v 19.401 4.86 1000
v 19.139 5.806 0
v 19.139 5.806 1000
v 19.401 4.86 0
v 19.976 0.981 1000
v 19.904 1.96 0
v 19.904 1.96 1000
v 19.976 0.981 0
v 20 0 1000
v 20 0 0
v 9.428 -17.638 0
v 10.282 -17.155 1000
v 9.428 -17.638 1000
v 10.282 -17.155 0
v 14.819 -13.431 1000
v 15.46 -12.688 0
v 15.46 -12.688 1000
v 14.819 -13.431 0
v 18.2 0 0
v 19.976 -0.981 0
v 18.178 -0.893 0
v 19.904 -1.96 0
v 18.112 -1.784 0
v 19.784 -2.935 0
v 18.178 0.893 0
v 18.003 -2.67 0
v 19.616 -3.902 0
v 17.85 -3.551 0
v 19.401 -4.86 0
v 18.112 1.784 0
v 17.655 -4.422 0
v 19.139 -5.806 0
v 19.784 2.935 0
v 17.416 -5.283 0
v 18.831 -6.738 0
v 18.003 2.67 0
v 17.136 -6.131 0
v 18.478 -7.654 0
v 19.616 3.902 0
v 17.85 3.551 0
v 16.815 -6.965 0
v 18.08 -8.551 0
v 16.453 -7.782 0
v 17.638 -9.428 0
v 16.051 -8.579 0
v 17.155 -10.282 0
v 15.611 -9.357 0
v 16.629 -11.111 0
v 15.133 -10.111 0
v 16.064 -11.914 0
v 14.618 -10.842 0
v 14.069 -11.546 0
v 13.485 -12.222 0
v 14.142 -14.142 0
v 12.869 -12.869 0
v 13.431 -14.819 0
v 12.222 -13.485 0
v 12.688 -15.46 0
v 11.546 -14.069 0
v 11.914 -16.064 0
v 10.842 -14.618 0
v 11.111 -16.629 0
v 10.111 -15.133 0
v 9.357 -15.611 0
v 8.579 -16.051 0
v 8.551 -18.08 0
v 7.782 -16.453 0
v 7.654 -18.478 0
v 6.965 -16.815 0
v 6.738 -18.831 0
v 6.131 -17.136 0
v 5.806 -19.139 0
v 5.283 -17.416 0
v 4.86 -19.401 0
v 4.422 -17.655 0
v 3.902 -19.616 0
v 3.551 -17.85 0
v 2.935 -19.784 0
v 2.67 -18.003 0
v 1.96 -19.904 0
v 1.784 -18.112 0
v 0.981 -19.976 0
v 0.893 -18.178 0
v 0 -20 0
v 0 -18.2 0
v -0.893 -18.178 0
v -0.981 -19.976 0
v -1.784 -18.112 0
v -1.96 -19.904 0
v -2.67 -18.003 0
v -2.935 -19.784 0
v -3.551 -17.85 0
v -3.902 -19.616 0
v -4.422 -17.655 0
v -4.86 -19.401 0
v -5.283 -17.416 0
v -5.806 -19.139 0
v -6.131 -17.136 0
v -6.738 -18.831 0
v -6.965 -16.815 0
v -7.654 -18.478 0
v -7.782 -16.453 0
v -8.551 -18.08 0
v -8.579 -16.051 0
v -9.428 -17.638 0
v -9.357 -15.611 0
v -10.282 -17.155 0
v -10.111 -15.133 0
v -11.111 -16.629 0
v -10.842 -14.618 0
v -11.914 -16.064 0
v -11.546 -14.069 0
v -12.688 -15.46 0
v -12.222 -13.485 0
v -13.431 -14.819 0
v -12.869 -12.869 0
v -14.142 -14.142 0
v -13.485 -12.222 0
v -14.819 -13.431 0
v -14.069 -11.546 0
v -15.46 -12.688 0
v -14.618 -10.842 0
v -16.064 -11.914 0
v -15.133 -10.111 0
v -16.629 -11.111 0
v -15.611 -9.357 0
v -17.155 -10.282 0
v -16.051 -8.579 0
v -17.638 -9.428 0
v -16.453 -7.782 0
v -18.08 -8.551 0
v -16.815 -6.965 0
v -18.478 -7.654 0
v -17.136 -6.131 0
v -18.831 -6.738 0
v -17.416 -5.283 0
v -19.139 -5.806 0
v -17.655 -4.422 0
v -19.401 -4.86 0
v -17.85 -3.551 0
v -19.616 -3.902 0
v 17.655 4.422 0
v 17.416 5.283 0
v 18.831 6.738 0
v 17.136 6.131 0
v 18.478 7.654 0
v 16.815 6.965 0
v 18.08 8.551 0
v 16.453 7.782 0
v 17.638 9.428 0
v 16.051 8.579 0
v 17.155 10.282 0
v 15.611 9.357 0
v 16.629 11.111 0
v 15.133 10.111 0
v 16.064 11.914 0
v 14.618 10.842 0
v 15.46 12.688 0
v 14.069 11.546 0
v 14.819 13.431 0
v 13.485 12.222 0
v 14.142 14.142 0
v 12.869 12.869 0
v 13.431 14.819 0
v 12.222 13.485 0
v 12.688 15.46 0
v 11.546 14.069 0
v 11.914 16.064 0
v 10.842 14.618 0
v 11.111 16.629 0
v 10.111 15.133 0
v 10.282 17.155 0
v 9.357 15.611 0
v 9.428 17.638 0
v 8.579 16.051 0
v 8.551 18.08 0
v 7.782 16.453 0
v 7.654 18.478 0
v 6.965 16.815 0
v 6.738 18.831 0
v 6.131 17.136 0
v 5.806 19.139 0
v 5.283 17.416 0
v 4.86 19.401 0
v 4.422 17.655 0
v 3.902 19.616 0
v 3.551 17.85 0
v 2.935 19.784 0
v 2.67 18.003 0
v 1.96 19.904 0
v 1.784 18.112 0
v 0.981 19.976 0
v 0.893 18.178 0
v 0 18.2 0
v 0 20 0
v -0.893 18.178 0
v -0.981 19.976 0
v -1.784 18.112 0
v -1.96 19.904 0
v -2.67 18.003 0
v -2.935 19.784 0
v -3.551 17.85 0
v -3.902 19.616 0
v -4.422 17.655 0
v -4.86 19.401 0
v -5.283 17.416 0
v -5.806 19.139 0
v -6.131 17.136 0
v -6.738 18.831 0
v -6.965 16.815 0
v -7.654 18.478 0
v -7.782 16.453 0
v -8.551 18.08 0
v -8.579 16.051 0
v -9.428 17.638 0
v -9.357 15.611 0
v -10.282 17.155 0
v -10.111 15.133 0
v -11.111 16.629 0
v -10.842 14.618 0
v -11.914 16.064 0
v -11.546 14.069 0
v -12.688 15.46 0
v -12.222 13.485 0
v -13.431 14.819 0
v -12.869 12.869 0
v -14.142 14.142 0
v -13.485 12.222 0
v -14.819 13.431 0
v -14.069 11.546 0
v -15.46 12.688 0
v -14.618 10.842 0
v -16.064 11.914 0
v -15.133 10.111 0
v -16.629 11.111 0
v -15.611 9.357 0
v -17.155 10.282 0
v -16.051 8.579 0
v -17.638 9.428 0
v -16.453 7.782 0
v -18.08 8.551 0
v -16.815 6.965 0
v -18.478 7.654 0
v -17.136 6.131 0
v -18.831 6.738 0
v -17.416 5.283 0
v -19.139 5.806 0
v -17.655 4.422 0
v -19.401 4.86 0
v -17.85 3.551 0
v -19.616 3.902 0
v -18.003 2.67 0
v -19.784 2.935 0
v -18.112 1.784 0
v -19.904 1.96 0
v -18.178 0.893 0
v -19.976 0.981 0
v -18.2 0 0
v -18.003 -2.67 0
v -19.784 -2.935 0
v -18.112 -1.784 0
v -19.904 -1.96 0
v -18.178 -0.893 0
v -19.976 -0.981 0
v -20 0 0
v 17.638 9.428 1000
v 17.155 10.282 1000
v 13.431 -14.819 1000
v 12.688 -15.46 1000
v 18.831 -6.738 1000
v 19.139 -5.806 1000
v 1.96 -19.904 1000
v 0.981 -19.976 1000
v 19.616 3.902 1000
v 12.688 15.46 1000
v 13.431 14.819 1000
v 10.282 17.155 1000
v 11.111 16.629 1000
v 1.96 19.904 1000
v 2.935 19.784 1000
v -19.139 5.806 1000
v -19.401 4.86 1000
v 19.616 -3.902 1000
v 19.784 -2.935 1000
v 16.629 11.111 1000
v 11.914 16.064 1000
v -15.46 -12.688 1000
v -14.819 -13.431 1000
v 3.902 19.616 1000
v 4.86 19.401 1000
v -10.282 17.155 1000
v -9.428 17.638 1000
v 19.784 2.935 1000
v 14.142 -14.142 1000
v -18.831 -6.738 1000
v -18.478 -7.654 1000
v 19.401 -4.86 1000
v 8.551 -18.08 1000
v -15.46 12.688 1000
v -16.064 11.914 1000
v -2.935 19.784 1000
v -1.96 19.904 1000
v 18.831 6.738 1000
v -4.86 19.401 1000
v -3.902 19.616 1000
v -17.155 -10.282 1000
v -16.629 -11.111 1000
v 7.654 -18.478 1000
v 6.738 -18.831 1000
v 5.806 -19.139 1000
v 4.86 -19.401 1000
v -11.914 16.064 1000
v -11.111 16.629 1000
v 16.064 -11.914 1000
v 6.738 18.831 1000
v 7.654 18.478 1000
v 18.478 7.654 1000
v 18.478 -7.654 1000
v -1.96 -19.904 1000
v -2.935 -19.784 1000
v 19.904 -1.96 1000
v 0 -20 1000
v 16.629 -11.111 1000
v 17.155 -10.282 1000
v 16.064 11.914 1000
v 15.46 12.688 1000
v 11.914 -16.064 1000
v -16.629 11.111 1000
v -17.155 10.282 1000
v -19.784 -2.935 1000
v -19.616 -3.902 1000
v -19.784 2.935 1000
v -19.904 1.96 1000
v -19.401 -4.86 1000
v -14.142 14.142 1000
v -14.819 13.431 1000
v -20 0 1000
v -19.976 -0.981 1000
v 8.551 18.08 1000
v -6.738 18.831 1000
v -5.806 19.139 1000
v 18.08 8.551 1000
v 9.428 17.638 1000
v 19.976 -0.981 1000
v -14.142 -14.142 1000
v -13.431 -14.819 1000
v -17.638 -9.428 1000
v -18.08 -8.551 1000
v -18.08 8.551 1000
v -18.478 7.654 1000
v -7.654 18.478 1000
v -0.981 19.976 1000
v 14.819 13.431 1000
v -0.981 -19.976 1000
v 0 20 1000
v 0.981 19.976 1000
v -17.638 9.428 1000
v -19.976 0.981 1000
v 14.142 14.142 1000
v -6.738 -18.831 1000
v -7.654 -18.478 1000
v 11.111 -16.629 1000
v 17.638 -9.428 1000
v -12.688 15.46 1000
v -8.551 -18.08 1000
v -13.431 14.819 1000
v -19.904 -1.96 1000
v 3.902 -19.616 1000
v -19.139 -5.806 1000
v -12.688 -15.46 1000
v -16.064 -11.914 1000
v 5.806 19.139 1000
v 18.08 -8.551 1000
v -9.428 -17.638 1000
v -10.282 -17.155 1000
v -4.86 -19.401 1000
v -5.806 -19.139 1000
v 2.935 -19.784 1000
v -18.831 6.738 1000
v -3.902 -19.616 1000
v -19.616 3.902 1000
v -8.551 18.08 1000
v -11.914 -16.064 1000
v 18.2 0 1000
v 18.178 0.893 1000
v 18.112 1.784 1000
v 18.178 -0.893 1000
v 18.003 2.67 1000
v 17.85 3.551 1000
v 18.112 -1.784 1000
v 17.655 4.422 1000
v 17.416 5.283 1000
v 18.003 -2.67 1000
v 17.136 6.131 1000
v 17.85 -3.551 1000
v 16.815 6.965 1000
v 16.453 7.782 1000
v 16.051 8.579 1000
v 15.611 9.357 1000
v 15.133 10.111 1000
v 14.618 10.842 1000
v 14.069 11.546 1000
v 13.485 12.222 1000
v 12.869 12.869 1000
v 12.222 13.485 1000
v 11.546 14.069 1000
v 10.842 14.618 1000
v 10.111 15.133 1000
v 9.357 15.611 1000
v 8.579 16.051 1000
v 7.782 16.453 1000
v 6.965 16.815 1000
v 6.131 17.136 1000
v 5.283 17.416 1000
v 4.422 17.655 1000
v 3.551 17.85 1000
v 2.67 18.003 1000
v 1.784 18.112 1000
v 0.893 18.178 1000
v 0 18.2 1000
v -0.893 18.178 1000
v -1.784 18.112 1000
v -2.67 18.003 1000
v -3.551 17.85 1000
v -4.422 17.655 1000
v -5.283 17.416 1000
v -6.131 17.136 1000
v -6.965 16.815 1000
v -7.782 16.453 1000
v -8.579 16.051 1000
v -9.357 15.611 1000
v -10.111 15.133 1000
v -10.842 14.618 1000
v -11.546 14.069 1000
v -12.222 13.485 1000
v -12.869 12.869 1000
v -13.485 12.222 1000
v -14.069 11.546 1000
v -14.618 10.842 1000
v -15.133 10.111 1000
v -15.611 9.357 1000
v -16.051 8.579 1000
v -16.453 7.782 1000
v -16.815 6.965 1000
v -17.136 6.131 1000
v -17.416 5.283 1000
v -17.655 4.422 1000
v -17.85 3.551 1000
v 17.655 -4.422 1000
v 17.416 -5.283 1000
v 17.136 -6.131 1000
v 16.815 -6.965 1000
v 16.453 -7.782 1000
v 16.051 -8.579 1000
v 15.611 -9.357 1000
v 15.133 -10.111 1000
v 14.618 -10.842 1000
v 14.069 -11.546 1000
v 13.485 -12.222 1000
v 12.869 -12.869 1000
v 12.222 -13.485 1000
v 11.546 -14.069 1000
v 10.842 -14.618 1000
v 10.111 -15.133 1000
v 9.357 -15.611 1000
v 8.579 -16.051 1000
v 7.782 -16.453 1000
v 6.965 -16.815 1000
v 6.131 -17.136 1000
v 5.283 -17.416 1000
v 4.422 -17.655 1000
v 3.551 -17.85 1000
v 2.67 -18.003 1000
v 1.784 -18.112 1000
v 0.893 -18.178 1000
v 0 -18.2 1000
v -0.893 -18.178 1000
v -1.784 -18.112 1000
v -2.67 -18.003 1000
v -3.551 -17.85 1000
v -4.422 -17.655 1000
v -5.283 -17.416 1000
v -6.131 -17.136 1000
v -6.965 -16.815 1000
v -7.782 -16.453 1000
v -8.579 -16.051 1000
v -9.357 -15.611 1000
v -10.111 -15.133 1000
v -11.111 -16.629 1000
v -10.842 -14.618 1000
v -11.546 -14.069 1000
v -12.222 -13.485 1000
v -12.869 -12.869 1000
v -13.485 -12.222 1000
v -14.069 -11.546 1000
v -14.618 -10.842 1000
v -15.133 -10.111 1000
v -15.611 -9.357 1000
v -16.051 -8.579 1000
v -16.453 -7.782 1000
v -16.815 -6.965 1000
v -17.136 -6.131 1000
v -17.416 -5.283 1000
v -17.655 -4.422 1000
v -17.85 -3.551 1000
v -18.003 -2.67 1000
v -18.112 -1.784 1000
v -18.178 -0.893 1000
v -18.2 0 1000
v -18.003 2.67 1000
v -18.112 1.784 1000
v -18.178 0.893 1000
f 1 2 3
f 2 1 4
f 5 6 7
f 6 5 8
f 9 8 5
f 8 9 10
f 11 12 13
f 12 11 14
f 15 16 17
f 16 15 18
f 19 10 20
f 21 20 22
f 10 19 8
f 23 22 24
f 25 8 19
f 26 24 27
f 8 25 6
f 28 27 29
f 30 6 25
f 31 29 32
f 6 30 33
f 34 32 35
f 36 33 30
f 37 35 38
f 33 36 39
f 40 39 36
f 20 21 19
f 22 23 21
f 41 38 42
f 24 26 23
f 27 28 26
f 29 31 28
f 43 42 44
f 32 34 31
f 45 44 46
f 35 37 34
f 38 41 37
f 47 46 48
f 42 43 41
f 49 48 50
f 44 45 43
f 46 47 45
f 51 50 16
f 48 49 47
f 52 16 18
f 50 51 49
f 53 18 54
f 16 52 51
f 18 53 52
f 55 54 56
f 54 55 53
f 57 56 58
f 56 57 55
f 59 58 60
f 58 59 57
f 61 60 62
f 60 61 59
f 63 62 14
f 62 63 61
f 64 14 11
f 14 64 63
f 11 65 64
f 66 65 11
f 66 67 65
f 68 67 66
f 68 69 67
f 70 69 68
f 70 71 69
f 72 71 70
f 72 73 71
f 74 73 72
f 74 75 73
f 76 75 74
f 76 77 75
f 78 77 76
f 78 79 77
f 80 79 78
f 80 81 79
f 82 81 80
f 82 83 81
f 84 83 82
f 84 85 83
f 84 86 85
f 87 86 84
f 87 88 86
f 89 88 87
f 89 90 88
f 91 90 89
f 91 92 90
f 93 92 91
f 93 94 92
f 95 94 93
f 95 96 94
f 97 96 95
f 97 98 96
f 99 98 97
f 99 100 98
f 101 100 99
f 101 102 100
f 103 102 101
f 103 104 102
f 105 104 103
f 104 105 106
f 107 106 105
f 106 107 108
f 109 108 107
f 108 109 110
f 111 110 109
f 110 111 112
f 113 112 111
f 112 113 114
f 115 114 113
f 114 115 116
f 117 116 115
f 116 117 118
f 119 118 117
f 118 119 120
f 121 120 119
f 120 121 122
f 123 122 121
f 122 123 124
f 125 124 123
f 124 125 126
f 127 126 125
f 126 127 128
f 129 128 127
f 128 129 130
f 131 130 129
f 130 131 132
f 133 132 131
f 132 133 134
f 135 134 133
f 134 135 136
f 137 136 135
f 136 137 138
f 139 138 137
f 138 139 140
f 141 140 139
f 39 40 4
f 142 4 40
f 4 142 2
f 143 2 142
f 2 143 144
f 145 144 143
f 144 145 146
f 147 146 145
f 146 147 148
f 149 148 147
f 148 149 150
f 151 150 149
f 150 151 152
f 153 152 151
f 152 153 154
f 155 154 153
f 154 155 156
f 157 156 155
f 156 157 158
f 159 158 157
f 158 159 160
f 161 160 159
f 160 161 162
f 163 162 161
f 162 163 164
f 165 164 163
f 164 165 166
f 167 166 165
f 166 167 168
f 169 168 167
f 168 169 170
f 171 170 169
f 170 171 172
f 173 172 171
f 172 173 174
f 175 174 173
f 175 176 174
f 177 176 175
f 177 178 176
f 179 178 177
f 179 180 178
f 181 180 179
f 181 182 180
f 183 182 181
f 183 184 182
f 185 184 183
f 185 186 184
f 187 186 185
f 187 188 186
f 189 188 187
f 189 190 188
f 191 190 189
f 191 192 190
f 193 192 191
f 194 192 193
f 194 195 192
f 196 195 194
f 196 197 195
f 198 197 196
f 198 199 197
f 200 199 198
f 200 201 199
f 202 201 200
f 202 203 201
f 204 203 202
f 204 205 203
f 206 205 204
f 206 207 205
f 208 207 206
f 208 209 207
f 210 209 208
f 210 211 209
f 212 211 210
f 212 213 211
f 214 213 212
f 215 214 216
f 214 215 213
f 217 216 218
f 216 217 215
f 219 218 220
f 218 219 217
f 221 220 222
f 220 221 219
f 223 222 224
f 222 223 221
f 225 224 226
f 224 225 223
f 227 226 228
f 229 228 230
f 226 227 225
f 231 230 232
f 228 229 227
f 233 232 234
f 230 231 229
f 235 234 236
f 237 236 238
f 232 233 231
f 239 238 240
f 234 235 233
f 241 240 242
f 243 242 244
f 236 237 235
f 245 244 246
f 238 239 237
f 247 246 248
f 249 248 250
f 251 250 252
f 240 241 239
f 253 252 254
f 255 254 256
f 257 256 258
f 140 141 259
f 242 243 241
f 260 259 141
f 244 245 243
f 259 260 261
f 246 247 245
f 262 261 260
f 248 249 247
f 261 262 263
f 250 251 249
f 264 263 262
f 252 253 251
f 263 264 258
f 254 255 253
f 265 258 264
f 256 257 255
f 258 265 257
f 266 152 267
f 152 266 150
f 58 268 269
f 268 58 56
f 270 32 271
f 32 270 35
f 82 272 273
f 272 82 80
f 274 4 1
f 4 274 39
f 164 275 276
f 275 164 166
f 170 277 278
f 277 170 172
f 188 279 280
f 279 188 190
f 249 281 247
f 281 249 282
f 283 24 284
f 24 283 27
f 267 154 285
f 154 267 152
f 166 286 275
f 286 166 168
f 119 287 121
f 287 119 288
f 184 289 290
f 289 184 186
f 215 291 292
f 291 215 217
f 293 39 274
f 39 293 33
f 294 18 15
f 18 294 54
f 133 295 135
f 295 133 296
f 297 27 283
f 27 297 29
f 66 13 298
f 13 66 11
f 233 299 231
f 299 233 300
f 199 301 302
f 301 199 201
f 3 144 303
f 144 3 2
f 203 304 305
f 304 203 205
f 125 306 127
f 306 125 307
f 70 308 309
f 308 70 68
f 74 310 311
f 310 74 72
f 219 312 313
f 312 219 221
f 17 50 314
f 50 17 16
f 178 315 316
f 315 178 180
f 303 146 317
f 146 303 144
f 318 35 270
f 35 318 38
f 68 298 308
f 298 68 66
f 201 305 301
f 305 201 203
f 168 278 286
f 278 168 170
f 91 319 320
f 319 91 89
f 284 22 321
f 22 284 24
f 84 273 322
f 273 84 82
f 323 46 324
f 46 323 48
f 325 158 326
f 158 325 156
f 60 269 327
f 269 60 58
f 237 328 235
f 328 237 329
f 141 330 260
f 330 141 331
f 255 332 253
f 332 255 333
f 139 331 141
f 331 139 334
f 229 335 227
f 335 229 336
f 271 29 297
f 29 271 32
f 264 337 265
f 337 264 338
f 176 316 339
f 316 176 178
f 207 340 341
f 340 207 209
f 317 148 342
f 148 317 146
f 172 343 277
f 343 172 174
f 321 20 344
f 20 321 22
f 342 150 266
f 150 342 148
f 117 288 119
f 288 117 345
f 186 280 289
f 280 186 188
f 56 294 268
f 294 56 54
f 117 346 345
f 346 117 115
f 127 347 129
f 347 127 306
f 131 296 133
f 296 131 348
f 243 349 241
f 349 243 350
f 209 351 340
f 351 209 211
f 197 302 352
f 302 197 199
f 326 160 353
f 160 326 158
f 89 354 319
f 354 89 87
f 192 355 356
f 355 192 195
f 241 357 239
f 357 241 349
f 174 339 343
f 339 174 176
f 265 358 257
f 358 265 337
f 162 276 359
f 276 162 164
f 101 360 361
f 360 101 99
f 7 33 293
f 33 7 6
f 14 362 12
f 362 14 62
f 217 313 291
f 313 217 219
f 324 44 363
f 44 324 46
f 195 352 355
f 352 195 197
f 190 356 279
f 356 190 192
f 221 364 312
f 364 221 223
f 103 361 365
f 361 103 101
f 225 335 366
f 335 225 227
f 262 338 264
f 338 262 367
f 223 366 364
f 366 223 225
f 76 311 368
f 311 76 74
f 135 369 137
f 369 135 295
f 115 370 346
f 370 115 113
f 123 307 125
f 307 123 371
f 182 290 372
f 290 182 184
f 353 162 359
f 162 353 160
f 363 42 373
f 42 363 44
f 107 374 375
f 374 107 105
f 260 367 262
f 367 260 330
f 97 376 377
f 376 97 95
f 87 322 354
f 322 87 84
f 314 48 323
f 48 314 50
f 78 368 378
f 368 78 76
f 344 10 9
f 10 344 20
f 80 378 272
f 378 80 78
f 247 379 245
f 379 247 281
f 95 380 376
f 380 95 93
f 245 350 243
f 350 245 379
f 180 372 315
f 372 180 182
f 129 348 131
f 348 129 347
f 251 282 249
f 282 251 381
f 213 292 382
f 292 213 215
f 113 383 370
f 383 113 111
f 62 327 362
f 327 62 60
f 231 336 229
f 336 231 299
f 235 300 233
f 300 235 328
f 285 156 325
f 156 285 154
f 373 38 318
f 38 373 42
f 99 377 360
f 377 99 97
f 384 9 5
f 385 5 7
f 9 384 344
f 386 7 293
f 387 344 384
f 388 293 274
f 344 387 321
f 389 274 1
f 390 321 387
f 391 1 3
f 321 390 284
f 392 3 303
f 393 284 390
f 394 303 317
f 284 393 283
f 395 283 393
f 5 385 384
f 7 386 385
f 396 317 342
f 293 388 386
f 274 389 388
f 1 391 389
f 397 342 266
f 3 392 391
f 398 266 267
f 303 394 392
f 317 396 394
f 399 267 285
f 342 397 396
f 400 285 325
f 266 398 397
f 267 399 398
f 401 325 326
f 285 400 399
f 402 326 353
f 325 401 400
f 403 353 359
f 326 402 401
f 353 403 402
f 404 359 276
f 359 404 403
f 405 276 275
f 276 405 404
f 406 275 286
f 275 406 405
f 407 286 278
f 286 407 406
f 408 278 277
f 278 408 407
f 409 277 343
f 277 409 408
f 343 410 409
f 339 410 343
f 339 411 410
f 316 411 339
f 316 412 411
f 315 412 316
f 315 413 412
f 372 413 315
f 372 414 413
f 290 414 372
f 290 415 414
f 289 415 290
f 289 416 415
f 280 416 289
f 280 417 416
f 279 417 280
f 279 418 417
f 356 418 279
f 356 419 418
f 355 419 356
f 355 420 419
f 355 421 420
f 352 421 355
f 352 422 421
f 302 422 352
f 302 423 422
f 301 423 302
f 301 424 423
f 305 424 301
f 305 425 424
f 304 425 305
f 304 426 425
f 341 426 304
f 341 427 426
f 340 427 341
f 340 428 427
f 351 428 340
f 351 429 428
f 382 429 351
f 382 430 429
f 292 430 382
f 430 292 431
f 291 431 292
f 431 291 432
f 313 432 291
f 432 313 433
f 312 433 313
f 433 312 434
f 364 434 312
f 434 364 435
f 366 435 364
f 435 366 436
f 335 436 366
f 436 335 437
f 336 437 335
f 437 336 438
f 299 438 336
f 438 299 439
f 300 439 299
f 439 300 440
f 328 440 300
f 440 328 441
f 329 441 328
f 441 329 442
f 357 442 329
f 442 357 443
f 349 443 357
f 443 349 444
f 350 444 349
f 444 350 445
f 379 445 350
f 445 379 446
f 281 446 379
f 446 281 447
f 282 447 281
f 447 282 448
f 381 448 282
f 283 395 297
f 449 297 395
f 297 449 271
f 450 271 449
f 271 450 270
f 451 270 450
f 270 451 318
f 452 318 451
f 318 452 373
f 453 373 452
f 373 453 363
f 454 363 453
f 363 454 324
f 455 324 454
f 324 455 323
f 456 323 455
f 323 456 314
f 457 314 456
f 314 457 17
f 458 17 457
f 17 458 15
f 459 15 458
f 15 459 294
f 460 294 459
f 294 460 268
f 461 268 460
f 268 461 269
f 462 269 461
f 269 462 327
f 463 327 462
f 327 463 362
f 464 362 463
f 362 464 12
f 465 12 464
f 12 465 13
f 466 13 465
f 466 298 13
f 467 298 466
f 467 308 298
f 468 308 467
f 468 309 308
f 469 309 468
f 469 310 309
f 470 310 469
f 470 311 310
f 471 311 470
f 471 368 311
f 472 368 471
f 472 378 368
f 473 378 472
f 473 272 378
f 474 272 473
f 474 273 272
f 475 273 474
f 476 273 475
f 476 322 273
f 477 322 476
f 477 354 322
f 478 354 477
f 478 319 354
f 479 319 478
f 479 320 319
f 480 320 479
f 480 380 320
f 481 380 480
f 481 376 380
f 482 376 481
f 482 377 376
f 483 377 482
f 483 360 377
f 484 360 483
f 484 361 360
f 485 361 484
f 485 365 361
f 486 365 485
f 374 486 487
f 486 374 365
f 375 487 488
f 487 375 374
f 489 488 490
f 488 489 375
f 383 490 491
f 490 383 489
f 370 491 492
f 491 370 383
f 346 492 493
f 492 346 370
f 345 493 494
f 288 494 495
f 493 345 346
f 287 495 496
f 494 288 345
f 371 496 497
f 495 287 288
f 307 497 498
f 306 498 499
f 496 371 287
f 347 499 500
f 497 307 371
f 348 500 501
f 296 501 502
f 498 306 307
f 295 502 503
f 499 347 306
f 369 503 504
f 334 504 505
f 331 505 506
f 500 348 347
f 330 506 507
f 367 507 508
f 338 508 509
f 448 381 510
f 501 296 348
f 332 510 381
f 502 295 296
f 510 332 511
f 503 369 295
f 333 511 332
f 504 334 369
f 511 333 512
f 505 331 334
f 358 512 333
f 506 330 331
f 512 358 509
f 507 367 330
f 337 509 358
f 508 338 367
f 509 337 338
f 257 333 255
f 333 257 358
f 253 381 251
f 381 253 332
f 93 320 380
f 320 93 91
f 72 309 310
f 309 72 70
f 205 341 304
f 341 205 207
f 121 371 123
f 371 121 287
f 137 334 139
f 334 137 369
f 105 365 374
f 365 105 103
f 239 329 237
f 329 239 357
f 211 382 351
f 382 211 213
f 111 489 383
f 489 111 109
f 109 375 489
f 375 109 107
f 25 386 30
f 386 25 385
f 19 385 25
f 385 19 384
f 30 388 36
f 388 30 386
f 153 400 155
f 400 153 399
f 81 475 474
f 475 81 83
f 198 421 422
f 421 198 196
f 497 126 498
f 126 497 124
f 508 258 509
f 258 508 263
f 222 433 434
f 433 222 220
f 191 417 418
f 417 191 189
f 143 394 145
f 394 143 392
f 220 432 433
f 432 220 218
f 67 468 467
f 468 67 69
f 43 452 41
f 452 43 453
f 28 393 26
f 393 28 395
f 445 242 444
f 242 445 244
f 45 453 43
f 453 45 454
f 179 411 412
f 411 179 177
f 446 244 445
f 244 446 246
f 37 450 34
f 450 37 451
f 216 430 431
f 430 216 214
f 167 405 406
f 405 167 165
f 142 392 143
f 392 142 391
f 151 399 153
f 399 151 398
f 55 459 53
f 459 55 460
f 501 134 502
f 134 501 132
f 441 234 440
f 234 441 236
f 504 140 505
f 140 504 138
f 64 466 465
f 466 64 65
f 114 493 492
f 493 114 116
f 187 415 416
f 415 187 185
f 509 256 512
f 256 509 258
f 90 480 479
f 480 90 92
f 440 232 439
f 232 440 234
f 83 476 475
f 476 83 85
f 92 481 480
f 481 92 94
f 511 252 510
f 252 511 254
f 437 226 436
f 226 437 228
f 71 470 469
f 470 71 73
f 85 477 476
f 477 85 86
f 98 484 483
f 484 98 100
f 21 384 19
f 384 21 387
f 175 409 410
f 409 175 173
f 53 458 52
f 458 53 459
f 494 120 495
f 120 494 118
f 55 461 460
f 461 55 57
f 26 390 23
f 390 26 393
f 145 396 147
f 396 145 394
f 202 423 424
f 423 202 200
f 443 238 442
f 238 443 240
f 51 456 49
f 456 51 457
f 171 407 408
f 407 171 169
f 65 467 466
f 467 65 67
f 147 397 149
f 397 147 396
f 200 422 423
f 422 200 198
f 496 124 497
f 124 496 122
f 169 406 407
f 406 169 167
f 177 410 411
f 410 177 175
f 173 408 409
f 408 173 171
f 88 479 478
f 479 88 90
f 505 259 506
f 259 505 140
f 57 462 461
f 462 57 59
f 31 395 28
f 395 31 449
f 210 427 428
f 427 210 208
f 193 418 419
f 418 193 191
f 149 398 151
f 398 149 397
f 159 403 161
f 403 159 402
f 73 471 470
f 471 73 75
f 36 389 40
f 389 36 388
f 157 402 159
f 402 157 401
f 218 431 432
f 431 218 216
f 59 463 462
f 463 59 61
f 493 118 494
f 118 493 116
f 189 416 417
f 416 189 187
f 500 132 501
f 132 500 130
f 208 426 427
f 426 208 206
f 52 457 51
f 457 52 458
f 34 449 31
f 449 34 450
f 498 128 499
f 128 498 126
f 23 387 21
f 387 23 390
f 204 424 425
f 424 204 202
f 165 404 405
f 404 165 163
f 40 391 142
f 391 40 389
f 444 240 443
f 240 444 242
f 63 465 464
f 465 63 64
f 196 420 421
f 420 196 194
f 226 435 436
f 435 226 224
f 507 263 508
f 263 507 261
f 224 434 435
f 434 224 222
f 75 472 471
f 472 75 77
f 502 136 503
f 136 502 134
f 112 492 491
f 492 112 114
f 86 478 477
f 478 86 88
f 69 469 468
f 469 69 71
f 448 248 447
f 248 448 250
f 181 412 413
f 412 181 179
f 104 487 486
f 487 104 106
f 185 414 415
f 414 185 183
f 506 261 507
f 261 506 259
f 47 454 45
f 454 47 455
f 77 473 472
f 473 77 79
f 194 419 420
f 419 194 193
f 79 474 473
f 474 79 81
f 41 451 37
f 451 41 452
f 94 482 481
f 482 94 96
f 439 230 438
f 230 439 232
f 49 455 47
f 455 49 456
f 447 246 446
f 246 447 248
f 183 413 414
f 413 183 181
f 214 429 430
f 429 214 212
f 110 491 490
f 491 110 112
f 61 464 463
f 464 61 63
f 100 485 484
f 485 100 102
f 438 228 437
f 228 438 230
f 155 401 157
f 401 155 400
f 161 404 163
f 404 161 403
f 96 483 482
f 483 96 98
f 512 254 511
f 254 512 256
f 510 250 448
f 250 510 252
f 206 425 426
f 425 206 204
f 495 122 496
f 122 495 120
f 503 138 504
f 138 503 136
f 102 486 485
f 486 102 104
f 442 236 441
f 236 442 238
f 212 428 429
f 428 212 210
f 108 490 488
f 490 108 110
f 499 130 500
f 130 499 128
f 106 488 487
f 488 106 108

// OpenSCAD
$fn = 128;

// HT pipe (DIN EN 1451 style) nominal DN40, length 1000 mm
// Typical dimensions (approx.): OD 40 mm, wall 1.8 mm
length = 1000;
od = 40;
wall = 1.8;

id = od - 2*wall;

difference() {
    cylinder(h = length, d = od);
    translate([0,0,-0.1]) cylinder(h = length + 0.2, d = id);
}
